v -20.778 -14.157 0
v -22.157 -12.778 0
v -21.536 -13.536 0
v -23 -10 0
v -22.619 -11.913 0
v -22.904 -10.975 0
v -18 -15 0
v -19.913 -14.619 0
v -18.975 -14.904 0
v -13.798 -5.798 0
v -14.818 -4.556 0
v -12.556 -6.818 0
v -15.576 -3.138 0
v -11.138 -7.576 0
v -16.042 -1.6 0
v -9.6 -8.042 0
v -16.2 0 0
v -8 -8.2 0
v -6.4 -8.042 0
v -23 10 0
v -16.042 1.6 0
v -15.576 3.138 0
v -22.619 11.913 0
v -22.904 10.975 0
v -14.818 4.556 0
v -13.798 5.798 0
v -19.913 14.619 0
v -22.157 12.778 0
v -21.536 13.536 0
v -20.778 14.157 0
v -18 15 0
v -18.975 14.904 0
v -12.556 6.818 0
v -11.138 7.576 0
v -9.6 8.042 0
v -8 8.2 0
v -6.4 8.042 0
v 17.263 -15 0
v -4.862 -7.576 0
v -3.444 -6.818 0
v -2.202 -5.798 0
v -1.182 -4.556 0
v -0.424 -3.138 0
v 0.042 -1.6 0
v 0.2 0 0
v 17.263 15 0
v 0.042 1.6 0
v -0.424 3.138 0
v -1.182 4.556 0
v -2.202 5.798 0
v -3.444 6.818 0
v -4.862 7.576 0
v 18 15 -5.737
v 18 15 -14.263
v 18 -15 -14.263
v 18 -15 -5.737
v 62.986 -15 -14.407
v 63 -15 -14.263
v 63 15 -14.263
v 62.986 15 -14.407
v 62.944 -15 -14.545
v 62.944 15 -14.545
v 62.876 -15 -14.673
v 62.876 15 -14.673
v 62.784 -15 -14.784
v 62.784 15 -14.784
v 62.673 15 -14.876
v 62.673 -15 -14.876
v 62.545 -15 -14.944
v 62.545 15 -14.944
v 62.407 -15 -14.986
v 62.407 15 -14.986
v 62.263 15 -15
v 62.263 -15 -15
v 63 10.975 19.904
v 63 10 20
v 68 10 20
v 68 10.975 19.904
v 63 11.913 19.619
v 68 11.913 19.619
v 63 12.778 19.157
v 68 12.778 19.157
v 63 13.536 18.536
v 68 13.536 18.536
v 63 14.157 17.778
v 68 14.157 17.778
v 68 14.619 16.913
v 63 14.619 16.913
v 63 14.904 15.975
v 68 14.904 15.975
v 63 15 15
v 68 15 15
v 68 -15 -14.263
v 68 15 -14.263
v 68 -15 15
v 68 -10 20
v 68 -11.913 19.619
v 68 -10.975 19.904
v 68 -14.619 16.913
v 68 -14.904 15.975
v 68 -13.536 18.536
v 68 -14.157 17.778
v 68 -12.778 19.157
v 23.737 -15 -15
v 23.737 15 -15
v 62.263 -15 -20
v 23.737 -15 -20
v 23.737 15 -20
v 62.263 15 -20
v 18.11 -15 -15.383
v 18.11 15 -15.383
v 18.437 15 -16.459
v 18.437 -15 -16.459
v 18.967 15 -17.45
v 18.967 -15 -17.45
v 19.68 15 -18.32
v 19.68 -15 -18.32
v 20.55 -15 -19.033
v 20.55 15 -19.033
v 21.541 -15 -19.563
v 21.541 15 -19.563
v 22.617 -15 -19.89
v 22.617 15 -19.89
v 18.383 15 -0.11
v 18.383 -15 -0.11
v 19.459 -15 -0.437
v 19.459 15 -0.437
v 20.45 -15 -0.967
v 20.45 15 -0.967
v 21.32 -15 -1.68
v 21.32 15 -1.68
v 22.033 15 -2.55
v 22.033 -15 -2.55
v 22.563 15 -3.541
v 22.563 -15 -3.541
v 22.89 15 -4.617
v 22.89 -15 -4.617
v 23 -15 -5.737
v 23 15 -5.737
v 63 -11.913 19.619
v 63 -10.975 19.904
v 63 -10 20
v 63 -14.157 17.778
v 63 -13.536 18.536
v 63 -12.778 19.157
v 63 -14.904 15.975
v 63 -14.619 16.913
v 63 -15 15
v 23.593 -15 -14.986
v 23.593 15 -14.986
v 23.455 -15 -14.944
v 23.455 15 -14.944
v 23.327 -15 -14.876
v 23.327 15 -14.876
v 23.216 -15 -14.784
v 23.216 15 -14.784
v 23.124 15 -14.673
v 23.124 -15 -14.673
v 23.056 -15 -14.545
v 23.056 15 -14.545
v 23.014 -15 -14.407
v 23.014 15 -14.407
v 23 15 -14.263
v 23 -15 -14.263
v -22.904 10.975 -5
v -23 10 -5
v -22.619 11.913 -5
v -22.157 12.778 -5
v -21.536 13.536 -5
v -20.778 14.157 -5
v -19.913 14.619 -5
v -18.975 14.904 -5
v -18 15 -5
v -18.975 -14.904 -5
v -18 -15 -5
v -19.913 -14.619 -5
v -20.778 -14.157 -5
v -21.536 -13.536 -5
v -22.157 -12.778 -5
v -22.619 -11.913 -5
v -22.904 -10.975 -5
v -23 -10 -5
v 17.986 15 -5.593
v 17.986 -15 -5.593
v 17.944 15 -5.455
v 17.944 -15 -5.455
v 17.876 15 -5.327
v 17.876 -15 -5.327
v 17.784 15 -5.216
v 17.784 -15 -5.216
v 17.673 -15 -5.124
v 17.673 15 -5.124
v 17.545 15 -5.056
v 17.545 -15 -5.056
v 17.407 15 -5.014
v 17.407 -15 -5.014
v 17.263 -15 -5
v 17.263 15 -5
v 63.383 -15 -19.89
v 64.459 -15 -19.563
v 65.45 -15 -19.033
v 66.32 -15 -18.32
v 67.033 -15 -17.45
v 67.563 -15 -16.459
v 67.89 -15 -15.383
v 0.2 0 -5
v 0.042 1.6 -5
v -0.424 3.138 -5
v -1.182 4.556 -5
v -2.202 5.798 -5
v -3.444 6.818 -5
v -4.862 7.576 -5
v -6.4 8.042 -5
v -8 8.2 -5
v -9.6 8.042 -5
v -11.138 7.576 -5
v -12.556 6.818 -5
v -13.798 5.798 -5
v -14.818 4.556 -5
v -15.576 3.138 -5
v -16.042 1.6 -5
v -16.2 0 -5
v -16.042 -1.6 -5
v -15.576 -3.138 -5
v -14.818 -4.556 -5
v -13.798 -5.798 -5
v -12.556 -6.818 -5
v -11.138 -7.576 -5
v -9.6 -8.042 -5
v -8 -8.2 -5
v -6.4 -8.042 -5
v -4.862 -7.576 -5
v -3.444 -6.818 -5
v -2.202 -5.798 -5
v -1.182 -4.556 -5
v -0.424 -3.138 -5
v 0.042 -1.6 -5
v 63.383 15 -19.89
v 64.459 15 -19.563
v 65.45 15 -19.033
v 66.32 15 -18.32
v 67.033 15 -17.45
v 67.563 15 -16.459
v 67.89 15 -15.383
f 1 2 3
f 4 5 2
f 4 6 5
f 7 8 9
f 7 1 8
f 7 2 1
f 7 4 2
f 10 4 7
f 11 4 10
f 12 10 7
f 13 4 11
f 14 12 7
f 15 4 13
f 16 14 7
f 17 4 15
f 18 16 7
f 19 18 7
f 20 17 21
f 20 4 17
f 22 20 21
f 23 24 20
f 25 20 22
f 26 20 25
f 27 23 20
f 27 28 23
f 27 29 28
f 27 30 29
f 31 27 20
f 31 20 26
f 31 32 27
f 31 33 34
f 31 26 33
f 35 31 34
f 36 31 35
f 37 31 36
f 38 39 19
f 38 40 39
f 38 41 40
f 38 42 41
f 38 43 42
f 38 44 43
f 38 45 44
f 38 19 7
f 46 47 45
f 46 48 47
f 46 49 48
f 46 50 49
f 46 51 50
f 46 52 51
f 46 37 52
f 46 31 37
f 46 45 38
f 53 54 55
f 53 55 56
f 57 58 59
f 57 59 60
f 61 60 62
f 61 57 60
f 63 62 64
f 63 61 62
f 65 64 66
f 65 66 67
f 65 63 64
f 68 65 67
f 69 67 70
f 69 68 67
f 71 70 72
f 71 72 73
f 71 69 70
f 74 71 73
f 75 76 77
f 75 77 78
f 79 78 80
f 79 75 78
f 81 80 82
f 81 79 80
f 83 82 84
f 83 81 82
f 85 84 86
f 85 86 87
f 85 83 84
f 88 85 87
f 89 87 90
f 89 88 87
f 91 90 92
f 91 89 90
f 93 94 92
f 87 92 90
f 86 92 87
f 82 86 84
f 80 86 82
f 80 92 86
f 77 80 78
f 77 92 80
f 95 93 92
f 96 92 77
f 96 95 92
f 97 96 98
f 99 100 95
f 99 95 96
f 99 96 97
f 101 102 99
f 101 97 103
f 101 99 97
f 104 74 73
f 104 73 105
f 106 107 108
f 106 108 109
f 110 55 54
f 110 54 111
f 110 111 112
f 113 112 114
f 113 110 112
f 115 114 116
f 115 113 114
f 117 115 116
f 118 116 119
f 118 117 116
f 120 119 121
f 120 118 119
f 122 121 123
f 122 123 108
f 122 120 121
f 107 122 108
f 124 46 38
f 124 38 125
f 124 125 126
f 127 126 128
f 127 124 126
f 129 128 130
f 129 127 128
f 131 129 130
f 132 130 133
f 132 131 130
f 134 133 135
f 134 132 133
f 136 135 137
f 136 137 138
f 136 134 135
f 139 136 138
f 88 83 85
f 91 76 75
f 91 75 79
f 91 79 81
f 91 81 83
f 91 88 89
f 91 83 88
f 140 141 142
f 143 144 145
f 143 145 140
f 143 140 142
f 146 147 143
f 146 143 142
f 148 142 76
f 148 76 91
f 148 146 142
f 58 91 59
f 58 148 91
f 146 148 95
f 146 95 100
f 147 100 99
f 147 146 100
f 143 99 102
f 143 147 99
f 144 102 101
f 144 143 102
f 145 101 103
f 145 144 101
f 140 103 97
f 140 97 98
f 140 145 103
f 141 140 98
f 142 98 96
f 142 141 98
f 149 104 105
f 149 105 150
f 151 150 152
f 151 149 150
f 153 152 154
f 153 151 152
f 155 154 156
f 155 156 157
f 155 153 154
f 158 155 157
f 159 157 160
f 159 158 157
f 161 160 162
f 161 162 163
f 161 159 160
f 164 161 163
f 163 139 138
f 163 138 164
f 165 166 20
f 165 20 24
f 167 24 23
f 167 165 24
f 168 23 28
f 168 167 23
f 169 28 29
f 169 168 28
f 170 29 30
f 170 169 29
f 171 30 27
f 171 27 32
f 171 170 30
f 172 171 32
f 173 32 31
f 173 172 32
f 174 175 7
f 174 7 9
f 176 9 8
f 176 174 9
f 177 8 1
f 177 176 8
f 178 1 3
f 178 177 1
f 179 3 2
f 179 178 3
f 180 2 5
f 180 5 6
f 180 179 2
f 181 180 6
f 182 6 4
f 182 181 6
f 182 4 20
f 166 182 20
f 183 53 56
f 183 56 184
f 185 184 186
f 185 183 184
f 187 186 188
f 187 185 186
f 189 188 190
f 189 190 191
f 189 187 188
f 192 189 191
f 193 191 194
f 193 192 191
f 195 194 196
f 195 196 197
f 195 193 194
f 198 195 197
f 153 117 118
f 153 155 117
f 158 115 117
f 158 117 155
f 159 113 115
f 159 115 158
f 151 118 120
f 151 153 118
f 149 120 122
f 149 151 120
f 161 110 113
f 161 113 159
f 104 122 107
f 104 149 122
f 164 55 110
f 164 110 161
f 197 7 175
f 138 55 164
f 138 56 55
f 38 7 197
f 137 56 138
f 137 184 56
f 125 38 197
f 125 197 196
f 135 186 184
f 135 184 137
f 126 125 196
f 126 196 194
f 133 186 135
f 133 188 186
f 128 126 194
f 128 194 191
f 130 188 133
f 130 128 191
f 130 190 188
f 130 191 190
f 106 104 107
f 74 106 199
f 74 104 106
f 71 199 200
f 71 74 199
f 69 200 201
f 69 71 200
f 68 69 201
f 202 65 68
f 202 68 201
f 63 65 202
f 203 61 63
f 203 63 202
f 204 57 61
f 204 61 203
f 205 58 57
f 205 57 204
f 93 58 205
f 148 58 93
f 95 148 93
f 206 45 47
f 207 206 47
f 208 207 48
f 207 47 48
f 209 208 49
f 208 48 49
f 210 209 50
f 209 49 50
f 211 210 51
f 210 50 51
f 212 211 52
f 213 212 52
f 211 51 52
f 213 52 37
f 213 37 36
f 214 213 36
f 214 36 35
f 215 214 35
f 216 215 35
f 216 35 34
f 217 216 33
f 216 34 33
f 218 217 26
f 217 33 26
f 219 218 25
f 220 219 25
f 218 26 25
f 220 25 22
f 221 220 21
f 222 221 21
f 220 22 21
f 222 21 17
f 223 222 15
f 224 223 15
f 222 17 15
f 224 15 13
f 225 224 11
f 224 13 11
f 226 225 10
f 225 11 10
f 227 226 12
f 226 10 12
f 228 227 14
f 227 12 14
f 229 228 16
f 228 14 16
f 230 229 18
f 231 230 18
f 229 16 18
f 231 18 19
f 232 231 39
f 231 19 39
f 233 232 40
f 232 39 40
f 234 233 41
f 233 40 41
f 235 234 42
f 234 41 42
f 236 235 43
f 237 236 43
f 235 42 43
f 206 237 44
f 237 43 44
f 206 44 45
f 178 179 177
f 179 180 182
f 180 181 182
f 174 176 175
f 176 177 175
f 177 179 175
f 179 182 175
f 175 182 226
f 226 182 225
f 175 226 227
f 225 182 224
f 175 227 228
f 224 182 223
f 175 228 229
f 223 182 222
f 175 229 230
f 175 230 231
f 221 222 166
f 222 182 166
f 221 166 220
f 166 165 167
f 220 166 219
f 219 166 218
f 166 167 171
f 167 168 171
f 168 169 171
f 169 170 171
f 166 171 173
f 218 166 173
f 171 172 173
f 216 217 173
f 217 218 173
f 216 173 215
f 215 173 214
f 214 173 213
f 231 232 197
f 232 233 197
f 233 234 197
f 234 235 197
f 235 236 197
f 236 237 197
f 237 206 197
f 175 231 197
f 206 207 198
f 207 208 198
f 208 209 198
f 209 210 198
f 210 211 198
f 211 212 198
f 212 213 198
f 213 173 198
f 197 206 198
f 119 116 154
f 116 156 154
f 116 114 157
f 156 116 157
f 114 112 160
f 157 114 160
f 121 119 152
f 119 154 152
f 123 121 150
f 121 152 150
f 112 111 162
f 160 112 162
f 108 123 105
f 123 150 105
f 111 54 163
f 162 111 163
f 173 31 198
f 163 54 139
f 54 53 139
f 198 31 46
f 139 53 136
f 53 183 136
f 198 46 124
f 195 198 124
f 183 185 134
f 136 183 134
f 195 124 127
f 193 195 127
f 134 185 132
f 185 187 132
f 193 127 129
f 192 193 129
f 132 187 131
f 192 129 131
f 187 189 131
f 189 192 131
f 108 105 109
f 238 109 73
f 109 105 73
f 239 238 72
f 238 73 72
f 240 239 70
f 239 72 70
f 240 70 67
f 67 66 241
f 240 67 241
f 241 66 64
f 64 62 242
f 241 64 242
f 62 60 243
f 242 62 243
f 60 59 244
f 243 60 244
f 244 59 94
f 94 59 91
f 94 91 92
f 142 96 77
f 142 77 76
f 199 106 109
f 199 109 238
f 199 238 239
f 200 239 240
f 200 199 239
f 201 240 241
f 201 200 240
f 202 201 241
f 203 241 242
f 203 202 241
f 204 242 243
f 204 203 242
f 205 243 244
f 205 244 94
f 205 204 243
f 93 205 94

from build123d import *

# Parameters (mm, degrees)
SZKIC1_W                           = 46
SZKIC1_H                           = 30
SZKIC1_R                           = 8.2
ODGI_CIE_BAZOWE1_DEPTH             = 5
ODGI_CIE_KRAW_DZI1_STRIP_W         = 21.4732
ODGI_CIE_KRAW_DZI1_STRIP_H         = 5
ODGI_CIE_KRAW_DZI1_STRIP_CUT_DEPTH = 30
ODGI_CIE_KRAW_DZI1_DEPTH           = 30
ODGI_CIE_KRAW_DZI2_STRIP_W         = 21.4732
ODGI_CIE_KRAW_DZI2_STRIP_H         = 5
ODGI_CIE_KRAW_DZI2_STRIP_CUT_DEPTH = 30
ODGI_CIE_KRAW_DZI2_DEPTH           = 30
ODGI_CIE_KRAW_DZI3_STRIP_W         = 21.4732
ODGI_CIE_KRAW_DZI3_STRIP_H         = 5
ODGI_CIE_KRAW_DZI3_STRIP_CUT_DEPTH = 30
ODGI_CIE_KRAW_DZI3_DEPTH           = 30
OD_AM_START                        = 63
OD_AM_NARO_NIK1_DEPTH              = 5
OD_AM_START_2                      = -5
OD_AM_NARO_NIK1_2_DEPTH            = 5


# Read off the part's stored shape, not the designer's step: Odłam narożnik1
# Sheet-metal steps are written as plain solids
with BuildPart() as part:
    # Szkic1 → Odgięcie bazowe1 (new body)
    with BuildSketch(Plane.XY):
        Rectangle(SZKIC1_W, SZKIC1_H)
        with Locations((-8, 0)):
            Circle(SZKIC1_R, mode=Mode.SUBTRACT)
    extrude(amount=-ODGI_CIE_BAZOWE1_DEPTH)

    # Odgięcie krawędzi1 strip (across the edge) → Odgięcie krawędzi1 strip cut (cut)
    with BuildSketch(Plane(origin=(23, 15, -5), x_dir=(-1, 0, 0), z_dir=(0, -1, 0))):
        with Locations((-5, -2.5)):
            Rectangle(ODGI_CIE_KRAW_DZI1_STRIP_W, ODGI_CIE_KRAW_DZI1_STRIP_H)
    extrude(amount=ODGI_CIE_KRAW_DZI1_STRIP_CUT_DEPTH, mode=Mode.SUBTRACT)

    # Odgięcie krawędzi1 section (across the edge) → Odgięcie krawędzi1 (add)
    with BuildSketch(Plane(origin=(23, 15, -5), x_dir=(-1, 0, 0), z_dir=(0, -1, 0))):
        with BuildLine():
            Line((0, 0.7366), (0, 15))
            Line((0, 15), (5, 15))
            Line((5, 15), (5, 0.7366))
            ThreePointArc((5, 0.7366), (5.215745145, 0.215745145), (5.7366, 0))
            Line((5.7366, 0), (5.7366, -5))
            ThreePointArc((5.7366, -5), (1.680211239, -3.319788761), (0, 0.7366))
        make_face()
    extrude(amount=ODGI_CIE_KRAW_DZI1_DEPTH)

    # Odgięcie krawędzi2 strip (across the edge) → Odgięcie krawędzi2 strip cut (cut)
    with BuildSketch(Plane(origin=(23, -15, -20), x_dir=(0, 0, 1), z_dir=(0, 1, 0))):
        with Locations((-5, -2.5)):
            Rectangle(ODGI_CIE_KRAW_DZI2_STRIP_W, ODGI_CIE_KRAW_DZI2_STRIP_H)
    extrude(amount=ODGI_CIE_KRAW_DZI2_STRIP_CUT_DEPTH, mode=Mode.SUBTRACT)

    # Odgięcie krawędzi2 section (across the edge) → Odgięcie krawędzi2 (add)
    with BuildSketch(Plane(origin=(23, -15, -20), x_dir=(0, 0, 1), z_dir=(0, 1, 0))):
        with BuildLine():
            Line((0, 0.7366), (0, 45))
            Line((0, 45), (5, 45))
            Line((5, 45), (5, 0.7366))
            ThreePointArc((5, 0.7366), (5.215745145, 0.215745145), (5.7366, 0))
            Line((5.7366, 0), (5.7366, -5))
            ThreePointArc((5.7366, -5), (1.680211239, -3.319788761), (0, 0.7366))
        make_face()
    extrude(amount=ODGI_CIE_KRAW_DZI2_DEPTH)

    # Odgięcie krawędzi3 strip (across the edge) → Odgięcie krawędzi3 strip cut (cut)
    with BuildSketch(Plane(origin=(68, -15, -15), x_dir=(-1, 0, 0), z_dir=(0, 1, 0))):
        with Locations((-5, -2.5)):
            Rectangle(ODGI_CIE_KRAW_DZI3_STRIP_W, ODGI_CIE_KRAW_DZI3_STRIP_H)
    extrude(amount=ODGI_CIE_KRAW_DZI3_STRIP_CUT_DEPTH, mode=Mode.SUBTRACT)

    # Odgięcie krawędzi3 section (across the edge) → Odgięcie krawędzi3 (add)
    with BuildSketch(Plane(origin=(68, -15, -15), x_dir=(-1, 0, 0), z_dir=(0, 1, 0))):
        with BuildLine():
            Line((0, 0.7366), (0, 35))
            Line((0, 35), (5, 35))
            Line((5, 35), (5, 0.7366))
            ThreePointArc((5, 0.7366), (5.215745145, 0.215745145), (5.7366, 0))
            Line((5.7366, 0), (5.7366, -5))
            ThreePointArc((5.7366, -5), (1.680211239, -3.319788761), (0, 0.7366))
        make_face()
    extrude(amount=ODGI_CIE_KRAW_DZI3_DEPTH)

    # Odłam narożnik1 outline → Odłam narożnik1 (cut)
    with BuildSketch(Plane.YZ.offset(OD_AM_START)):
        with BuildLine():
            Line((-15, 20), (-15, 15))
            ThreePointArc((-15, 15), (-13.535533906, 18.535533906), (-10, 20))
            Line((-10, 20), (-15, 20))
        make_face()
        with BuildLine():
            Line((15, 20), (10, 20))
            ThreePointArc((10, 20), (13.535533906, 18.535533906), (15, 15))
            Line((15, 15), (15, 20))
        make_face()
    extrude(amount=OD_AM_NARO_NIK1_DEPTH, mode=Mode.SUBTRACT)

    # Od_am naro_nik1 2 outline → Od_am naro_nik1 2 (cut)
    with BuildSketch(Plane.XY.offset(OD_AM_START_2)):
        with BuildLine():
            ThreePointArc((-18, -15), (-21.535533906, -13.535533906), (-23, -10))
            Line((-23, -10), (-23, -15))
            Line((-23, -15), (-18, -15))
        make_face()
        with BuildLine():
            ThreePointArc((-23, 10), (-21.535533906, 13.535533906), (-18, 15))
            Line((-18, 15), (-23, 15))
            Line((-23, 15), (-23, 10))
        make_face()
    extrude(amount=OD_AM_NARO_NIK1_2_DEPTH, mode=Mode.SUBTRACT)


solid = part.part
